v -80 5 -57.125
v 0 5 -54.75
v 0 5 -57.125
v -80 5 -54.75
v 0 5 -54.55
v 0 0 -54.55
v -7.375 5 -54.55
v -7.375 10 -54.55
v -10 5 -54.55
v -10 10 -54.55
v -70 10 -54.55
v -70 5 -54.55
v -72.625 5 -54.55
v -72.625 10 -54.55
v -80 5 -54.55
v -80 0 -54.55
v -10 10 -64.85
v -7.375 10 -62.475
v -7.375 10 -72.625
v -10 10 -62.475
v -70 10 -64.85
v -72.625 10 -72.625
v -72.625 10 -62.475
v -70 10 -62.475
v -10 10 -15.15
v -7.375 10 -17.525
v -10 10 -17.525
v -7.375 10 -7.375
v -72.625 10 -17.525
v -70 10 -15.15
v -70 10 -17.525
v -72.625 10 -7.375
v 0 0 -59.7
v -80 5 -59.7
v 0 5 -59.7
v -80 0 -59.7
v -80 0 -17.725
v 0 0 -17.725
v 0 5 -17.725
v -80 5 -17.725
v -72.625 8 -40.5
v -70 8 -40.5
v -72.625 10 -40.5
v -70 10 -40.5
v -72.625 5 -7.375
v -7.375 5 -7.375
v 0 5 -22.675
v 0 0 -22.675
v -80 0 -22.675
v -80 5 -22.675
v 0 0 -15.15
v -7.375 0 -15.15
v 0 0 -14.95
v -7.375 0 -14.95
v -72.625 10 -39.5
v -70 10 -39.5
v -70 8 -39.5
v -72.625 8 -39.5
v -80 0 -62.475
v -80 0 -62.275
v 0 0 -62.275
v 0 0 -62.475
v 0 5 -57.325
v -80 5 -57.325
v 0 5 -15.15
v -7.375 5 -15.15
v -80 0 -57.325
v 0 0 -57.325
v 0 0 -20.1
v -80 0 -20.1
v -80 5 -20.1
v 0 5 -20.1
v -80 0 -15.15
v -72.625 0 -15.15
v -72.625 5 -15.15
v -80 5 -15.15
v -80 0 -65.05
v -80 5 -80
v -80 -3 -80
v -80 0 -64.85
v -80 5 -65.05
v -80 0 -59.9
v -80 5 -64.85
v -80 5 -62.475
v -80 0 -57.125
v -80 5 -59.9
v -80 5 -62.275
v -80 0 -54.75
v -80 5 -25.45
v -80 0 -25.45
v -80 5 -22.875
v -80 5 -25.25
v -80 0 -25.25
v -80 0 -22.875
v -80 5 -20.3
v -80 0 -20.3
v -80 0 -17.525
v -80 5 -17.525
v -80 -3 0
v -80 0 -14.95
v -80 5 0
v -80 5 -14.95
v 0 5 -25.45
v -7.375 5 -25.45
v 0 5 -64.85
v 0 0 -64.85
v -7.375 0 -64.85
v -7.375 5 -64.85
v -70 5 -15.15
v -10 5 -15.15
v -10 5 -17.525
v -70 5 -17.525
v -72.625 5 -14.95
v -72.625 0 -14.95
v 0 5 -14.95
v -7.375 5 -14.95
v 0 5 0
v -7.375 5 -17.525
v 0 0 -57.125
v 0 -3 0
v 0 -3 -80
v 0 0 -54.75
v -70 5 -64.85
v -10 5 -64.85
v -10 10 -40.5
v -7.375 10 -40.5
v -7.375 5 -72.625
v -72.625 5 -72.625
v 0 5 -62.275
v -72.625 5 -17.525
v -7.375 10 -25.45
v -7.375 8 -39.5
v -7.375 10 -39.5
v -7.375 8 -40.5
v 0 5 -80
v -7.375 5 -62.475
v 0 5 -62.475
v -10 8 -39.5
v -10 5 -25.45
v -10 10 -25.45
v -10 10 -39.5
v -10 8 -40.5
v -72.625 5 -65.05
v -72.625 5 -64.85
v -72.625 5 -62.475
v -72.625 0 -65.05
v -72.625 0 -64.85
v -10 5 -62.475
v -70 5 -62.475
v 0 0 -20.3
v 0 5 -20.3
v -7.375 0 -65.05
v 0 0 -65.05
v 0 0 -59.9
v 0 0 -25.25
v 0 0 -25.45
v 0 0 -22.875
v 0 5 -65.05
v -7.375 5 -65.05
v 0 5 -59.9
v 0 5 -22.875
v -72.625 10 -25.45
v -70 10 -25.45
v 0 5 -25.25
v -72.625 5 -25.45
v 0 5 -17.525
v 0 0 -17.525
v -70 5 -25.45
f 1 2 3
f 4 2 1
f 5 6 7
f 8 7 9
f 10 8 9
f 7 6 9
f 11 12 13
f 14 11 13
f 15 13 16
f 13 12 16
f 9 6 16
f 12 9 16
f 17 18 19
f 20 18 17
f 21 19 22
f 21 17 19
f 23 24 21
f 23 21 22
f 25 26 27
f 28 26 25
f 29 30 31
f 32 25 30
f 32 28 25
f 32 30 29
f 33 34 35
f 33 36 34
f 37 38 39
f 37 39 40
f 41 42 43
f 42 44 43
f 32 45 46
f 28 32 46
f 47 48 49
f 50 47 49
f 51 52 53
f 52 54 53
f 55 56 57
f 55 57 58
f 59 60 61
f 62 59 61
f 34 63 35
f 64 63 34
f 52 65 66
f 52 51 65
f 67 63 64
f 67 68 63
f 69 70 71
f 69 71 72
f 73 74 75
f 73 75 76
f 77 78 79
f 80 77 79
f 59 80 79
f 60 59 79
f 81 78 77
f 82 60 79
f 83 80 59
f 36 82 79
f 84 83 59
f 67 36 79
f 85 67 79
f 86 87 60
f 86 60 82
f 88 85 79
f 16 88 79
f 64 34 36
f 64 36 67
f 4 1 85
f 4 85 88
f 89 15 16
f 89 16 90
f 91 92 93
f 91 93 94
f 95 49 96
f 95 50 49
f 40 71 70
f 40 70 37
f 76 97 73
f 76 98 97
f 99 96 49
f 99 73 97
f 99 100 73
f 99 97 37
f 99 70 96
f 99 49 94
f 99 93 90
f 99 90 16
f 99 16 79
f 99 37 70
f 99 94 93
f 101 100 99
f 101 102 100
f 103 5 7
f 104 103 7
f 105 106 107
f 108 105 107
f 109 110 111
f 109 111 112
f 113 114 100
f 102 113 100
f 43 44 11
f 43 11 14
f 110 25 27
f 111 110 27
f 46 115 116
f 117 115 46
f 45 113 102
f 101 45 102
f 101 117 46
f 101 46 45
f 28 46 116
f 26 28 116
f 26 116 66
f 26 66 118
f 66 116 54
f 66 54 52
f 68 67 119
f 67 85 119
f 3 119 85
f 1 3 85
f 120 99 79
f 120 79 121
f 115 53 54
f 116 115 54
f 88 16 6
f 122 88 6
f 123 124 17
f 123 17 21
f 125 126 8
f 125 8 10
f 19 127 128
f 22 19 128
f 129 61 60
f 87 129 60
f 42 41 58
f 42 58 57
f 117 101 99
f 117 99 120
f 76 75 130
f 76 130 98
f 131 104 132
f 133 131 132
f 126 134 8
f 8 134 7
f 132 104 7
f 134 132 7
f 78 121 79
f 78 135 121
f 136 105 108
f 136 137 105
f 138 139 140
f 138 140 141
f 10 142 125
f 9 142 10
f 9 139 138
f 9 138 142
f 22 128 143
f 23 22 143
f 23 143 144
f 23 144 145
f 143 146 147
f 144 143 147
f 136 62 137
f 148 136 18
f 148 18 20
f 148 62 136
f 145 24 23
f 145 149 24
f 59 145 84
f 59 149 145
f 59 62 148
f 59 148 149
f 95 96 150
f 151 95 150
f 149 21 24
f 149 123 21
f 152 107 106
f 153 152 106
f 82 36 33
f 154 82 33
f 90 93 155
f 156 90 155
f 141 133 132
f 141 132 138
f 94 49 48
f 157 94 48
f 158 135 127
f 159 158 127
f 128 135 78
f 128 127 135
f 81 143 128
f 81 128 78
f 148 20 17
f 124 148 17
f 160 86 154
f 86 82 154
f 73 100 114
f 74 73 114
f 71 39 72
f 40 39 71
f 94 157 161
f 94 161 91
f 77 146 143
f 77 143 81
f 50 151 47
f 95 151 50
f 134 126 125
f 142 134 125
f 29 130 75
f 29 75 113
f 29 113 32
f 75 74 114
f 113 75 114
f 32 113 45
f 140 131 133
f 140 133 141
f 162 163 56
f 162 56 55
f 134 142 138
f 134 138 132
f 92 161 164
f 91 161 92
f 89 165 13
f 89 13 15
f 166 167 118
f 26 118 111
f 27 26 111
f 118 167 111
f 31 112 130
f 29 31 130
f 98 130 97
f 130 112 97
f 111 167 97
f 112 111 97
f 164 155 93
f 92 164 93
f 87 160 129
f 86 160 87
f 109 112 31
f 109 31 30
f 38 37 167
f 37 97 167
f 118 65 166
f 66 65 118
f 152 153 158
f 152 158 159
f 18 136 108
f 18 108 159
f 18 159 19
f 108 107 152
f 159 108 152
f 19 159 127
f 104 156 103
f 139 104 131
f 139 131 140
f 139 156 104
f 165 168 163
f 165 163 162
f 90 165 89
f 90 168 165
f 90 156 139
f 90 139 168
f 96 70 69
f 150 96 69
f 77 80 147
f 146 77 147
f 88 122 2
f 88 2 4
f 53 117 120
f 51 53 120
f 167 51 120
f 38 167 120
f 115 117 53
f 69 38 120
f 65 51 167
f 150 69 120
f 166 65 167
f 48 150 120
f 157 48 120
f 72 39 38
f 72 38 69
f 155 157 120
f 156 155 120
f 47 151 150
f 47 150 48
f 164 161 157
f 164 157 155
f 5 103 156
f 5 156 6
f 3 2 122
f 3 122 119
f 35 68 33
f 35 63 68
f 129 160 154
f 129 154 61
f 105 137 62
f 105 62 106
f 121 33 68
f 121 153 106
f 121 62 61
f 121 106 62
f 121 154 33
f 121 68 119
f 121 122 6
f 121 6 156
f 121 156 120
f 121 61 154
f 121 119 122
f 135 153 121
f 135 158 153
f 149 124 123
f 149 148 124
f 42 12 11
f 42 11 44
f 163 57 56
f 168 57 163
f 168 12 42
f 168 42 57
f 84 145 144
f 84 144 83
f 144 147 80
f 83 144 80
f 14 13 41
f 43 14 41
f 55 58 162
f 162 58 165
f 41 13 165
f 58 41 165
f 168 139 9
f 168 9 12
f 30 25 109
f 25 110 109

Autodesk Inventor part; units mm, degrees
ref_plane "YZ Plane" through (0, 0, 0) normal (1, 0, 0) x (0, 1, 0)
ref_plane "XZ Plane" through (0, 0, 0) normal (0, 1, 0) x (-1, 0, 0)
ref_plane "XY Plane" through (0, 0, 0) normal (0, 0, 1) x (1, 0, 0)
sketch "Boceto1" plane through (0, 0, 0) normal (0, 1, 0) x (-1, 0, 0)
  line L0 (0, 0) -> (80, 0)
  line L1 (80, 0) -> (80, -80)
  line L2 (80, -80) -> (0, -80)
  line L3 (0, -80) -> (0, 0)
  line L4 (10, -70) -> (70, -70)
  line L5 (70, -70) -> (70, -10)
  line L6 (70, -10) -> (10, -10)
  line L7 (10, -10) -> (10, -70)
  line L8 (0, -12.375) -> (80, -12.375)
  line L9 (0, -14.95) -> (80, -14.95)
  line L10 (0, -17.525) -> (80, -17.525)
  line L11 (80, -20.1) -> (0, -20.1)
  line L12 (0, -22.675) -> (80, -22.675)
  line L13 (0, -12.575) -> (80, -12.575)
  line L14 (0, -15.15) -> (80, -15.15)
  line L15 (0, -17.725) -> (80, -17.725)
  line L16 (80, -20.3) -> (0, -20.3)
  line L17 (0, -22.875) -> (80, -22.875)
  line L18 (0, -25.25) -> (80, -25.25)
  line L19 (0, -25.45) -> (80, -25.45)
  line L20 (10, -40) -> (80, -40)
  line L21 (0, -67.625) -> (80, -67.625)
  line L22 (0, -65.05) -> (80, -65.05)
  line L23 (0, -62.475) -> (80, -62.475)
  line L24 (80, -59.9) -> (0, -59.9)
  line L25 (0, -57.325) -> (80, -57.325)
  line L26 (0, -67.425) -> (80, -67.425)
  line L27 (0, -64.85) -> (80, -64.85)
  line L28 (0, -62.275) -> (80, -62.275)
  line L29 (80, -59.7) -> (0, -59.7)
  line L30 (0, -57.125) -> (80, -57.125)
  line L31 (0, -54.75) -> (80, -54.75)
  line L32 (0, -54.55) -> (80, -54.55)
  line L33 (72.625, -7.375) -> (7.375, -7.375)
  line L34 (7.375, -7.375) -> (7.375, -72.625)
  line L35 (7.375, -72.625) -> (72.625, -72.625)
  line L36 (72.625, -72.625) -> (72.625, -7.375)
  line L37 (7.375, 0) -> (0, 0)
  line L38 (7.375, -80) -> (0, -80)
  point P0 (10, -12.375)
  point P1 (70, -12.375)
  point P2 (10, -14.95)
  point P3 (70, -14.95)
  point P4 (10, -17.525)
  point P5 (70, -17.525)
  point P6 (70, -20.1)
  point P7 (10, -20.1)
  point P8 (10, -22.675)
  point P9 (70, -22.675)
  point P10 (10, -12.575)
  point P11 (70, -12.575)
  point P12 (10, -15.15)
  point P13 (70, -15.15)
  point P14 (10, -17.725)
  point P15 (70, -17.725)
  point P16 (70, -20.3)
  point P17 (10, -20.3)
  point P18 (10, -22.875)
  point P19 (70, -22.875)
  point P20 (10, -25.25)
  point P21 (70, -25.25)
  point P22 (10, -25.45)
  point P23 (70, -25.45)
  point P24 (10, -67.625)
  point P25 (70, -67.625)
  point P26 (10, -65.05)
  point P27 (70, -65.05)
  point P28 (10, -62.475)
  point P29 (70, -62.475)
  point P30 (70, -59.9)
  point P31 (10, -59.9)
  point P32 (10, -57.325)
  point P33 (70, -57.325)
  point P34 (10, -67.425)
  point P35 (70, -67.425)
  point P36 (10, -64.85)
  point P37 (70, -64.85)
  point P38 (10, -62.275)
  point P39 (70, -62.275)
  point P40 (70, -59.7)
  point P41 (10, -59.7)
  point P42 (10, -57.125)
  point P43 (70, -57.125)
  point P44 (10, -54.75)
  point P45 (70, -54.75)
  point P46 (10, -54.55)
  point P47 (70, -54.55)
  point P48 (72.625, -12.375)
  point P49 (7.375, -12.375)
  point P50 (72.625, -54.55)
  point P51 (72.625, -25.45)
  point P52 (70, -25.45)
  point P53 (70, -54.55)
  point P54 (7.375, -25.45)
  point P55 (7.375, -54.55)
  point P56 (10, -54.55)
  point P57 (10, -25.45)
  point P58 (10, -67.625)
  point P59 (7.375, -67.625)
  point P60 (72.625, -67.625)
  point P61 (70, -67.625)
  point P62 (7.375, -14.95)
  point P63 (72.625, -14.95)
  point P64 (72.625, -65.05)
  point P65 (70, -65.05)
  point P66 (10, -65.05)
  point P67 (7.375, -65.05)
  point P68 (70, -67.425)
  point P69 (10, -67.425)
  point P70 (10, -12.575)
  point P71 (70, -12.575)
  point P72 (72.625, -64.85)
  point P73 (7.375, -64.85)
  point P74 (7.375, -15.15)
  point P75 (70, -15.15)
  point P76 (7.375, -62.475)
  point P77 (10, -64.85)
  point P78 (10, -62.475)
  point P79 (72.625, -62.475)
  point P80 (70, -62.475)
  point P81 (70, -64.85)
  point P82 (7.375, -17.525)
  point P83 (10, -15.15)
  point P84 (72.625, -17.525)
  dimension "d0" = 80
  dimension "d1" = 80
  dimension "d2" = 60
  dimension "d3" = 60
  dimension "d4" = 10
  dimension "d5" = 10
  dimension "d6" = 2.375
  dimension "d7" = 0.2
  dimension "d8" = 2.375
  dimension "d9" = 0.2
  dimension "d10" = 0.2
  dimension "d11" = 0.2
  dimension "d12" = 0.2
  dimension "d13" = 2.375
  dimension "d14" = 2.375
  dimension "d15" = 2.375
  dimension "d16" = 2.375
  dimension "d17" = 0.2
  dimension "d35" = 5
extrude "Extrusión1" add sketch "Boceto1" along normal blind 5 contours L0 L1 L8 L36 L33 L34 L3 | L8 L34 L13 L3 | L13 L34 L9 L3 | L34 L33 L36 L8 L5 L6 L7 | L8 L7 L13 L34 | L1 L13 L36 L8 | L13 L7 L9 L34 | L8 L5 L13 L7 | L7 L6 L5 L8 | L1 L9 L36 L13 | L36 L13 L5 L8 | L14 L34 L10 L3 | L13 L5 L9 L7 | L36 L9 L5 L13 | L14 L7 L10 L34 | L1 L10 L36 L14 | L15 L34 L11 L3 | L14 L5 L10 L7 | L36 L10 L5 L14 | L15 L7 L11 L34 | L1 L11 L36 L15 | L16 L34 L12 L3 | L15 L5 L11 L7 | L36 L11 L5 L15 | L16 L7 L12 L34 | L1 L12 L36 L16 | L17 L34 L18 L3 | L16 L5 L12 L7 | L36 L12 L5 L16 | L17 L7 L18 L34 | L1 L18 L36 L17 | L19 L34 L32 L3 | L17 L5 L18 L7 | L36 L18 L5 L17 | L19 L7 L32 L34 | L1 L20 L36 L19 | L31 L34 L30 L3 | L19 L5 L20 L7 | L1 L32 L36 L20 | L36 L20 L5 L19 | L31 L7 L30 L34 | L7 L20 L5 L32 | L36 L32 L5 L20 | L25 L34 L29 L3 | L31 L5 L30 L7 | L1 L30 L36 L31 | L25 L7 L29 L34 | L31 L36 L30 L5 | L24 L34 L28 L3 | L25 L5 L29 L7 | L1 L29 L36 L25 | L24 L7 L28 L34 | L25 L36 L29 L5 | L23 L34 L27 L3 | L24 L5 L28 L7 | L1 L28 L36 L24 | L23 L7 L27 L34 | L24 L36 L28 L5 | L22 L34 L26 L3 | L23 L5 L27 L7 | L1 L27 L36 L23 | L26 L34 L21 L3 | L22 L7 L26 L34 | L23 L36 L27 L5 | L21 L34 L35 L36 L1 L2 L3 | L26 L7 L21 L34 | L22 L5 L26 L7 | L1 L26 L36 L22 | L21 L7 L4 L5 L36 L35 L34 | L26 L5 L21 L7 | L22 L36 L26 L5 | L1 L21 L36 L26 | L21 L5 L4 L7 | L26 L36 L21 L5
sketch "Boceto2" plane through (0, 0, 0) normal (0, -1, 0) x (1, 0, 0)
  line L0 (0, -80) -> (-80, -80) projected
  line L1 (-80, 0) -> (0, 0) projected
  line L2 (-80, -80) -> (-80, 0)
  line L3 (-80, 0) -> (0, 0)
  line L4 (-80, -65.05) -> (0, -65.05) construction
  line L5 (0, 0) -> (0, -80)
  line L6 (-80, -80) -> (0, -80)
extrude "Extrusión4" add sketch "Boceto2" along normal blind 3
extrude "Extrusión5" add sketch "Boceto1" along normal blind 10 contours L34 L33 L36 L8 L5 L6 L7 | L8 L7 L13 L34 | L13 L7 L9 L34 | L8 L5 L13 L7 | L7 L6 L5 L8 | L36 L13 L5 L8 | L9 L7 L14 L34 | L13 L5 L9 L7 | L36 L9 L5 L13 | L14 L7 L10 L34 | L9 L5 L14 L7 | L36 L14 L5 L9 | L36 L10 L5 L14 | L19 L7 L32 L34 | L36 L20 L5 L19 | L36 L32 L5 L20 | L23 L7 L27 L34 | L27 L7 L22 L34 | L22 L7 L26 L34 | L27 L5 L22 L7 | L23 L36 L27 L5 | L26 L7 L21 L34 | L22 L5 L26 L7 | L27 L36 L22 L5 | L21 L7 L4 L5 L36 L35 L34 | L26 L5 L21 L7 | L22 L36 L26 L5 | L21 L5 L4 L7 | L26 L36 L21 L5
sketch "Boceto3" plane through (0, 10, 0) normal (0, 1, 0) x (1, 0, 0)
  line L0 (-7.375, 25.45) -> (-7.375, 54.55) projected
  line L1 (-7.375, 40) -> (-86.5517, 40)
  line L2 (-5, 39.5) -> (-84.1767, 39.5)
  line L3 (-5, 40.5) -> (-84.1767, 40.5)
  line L4 (-10, 54.55) -> (-10, 25.45) projected
  line L5 (-5, 40.5) -> (-5, 39.5)
  line L6 (-84.1767, 40.5) -> (-84.1767, 39.5)
  point P0 (0, 0)
  point P1 (-10, 40)
  point P2 (-10, 39.5)
  point P3 (-10, 40.5)
  point P4 (-7.375, 39.5)
  point P5 (-7.375, 40.5)
  dimension "d31" = 0.5
  dimension "d32" = 0.5
extrude "Extrusión6" cut sketch "Boceto3" against normal blind 2 contours L2 L4 L1 L0 | L1 L4 L3 L0 | L2 L6 L1 L4 | L1 L6 L3 L4
equation "\"d8\" = d6"
equation "\"d9\" = d7"
equation "\"d10\" = d9"
equation "\"d11\" = d7"
equation "\"d12\" = d7"
equation "\"d13\" = d6"
equation "\"d14\" = d6"
equation "\"d15\" = d6"
equation "\"d16\" = d6"
equation "\"d17\" = d7"
properties part number "Cortador Ancho PDMS5"
